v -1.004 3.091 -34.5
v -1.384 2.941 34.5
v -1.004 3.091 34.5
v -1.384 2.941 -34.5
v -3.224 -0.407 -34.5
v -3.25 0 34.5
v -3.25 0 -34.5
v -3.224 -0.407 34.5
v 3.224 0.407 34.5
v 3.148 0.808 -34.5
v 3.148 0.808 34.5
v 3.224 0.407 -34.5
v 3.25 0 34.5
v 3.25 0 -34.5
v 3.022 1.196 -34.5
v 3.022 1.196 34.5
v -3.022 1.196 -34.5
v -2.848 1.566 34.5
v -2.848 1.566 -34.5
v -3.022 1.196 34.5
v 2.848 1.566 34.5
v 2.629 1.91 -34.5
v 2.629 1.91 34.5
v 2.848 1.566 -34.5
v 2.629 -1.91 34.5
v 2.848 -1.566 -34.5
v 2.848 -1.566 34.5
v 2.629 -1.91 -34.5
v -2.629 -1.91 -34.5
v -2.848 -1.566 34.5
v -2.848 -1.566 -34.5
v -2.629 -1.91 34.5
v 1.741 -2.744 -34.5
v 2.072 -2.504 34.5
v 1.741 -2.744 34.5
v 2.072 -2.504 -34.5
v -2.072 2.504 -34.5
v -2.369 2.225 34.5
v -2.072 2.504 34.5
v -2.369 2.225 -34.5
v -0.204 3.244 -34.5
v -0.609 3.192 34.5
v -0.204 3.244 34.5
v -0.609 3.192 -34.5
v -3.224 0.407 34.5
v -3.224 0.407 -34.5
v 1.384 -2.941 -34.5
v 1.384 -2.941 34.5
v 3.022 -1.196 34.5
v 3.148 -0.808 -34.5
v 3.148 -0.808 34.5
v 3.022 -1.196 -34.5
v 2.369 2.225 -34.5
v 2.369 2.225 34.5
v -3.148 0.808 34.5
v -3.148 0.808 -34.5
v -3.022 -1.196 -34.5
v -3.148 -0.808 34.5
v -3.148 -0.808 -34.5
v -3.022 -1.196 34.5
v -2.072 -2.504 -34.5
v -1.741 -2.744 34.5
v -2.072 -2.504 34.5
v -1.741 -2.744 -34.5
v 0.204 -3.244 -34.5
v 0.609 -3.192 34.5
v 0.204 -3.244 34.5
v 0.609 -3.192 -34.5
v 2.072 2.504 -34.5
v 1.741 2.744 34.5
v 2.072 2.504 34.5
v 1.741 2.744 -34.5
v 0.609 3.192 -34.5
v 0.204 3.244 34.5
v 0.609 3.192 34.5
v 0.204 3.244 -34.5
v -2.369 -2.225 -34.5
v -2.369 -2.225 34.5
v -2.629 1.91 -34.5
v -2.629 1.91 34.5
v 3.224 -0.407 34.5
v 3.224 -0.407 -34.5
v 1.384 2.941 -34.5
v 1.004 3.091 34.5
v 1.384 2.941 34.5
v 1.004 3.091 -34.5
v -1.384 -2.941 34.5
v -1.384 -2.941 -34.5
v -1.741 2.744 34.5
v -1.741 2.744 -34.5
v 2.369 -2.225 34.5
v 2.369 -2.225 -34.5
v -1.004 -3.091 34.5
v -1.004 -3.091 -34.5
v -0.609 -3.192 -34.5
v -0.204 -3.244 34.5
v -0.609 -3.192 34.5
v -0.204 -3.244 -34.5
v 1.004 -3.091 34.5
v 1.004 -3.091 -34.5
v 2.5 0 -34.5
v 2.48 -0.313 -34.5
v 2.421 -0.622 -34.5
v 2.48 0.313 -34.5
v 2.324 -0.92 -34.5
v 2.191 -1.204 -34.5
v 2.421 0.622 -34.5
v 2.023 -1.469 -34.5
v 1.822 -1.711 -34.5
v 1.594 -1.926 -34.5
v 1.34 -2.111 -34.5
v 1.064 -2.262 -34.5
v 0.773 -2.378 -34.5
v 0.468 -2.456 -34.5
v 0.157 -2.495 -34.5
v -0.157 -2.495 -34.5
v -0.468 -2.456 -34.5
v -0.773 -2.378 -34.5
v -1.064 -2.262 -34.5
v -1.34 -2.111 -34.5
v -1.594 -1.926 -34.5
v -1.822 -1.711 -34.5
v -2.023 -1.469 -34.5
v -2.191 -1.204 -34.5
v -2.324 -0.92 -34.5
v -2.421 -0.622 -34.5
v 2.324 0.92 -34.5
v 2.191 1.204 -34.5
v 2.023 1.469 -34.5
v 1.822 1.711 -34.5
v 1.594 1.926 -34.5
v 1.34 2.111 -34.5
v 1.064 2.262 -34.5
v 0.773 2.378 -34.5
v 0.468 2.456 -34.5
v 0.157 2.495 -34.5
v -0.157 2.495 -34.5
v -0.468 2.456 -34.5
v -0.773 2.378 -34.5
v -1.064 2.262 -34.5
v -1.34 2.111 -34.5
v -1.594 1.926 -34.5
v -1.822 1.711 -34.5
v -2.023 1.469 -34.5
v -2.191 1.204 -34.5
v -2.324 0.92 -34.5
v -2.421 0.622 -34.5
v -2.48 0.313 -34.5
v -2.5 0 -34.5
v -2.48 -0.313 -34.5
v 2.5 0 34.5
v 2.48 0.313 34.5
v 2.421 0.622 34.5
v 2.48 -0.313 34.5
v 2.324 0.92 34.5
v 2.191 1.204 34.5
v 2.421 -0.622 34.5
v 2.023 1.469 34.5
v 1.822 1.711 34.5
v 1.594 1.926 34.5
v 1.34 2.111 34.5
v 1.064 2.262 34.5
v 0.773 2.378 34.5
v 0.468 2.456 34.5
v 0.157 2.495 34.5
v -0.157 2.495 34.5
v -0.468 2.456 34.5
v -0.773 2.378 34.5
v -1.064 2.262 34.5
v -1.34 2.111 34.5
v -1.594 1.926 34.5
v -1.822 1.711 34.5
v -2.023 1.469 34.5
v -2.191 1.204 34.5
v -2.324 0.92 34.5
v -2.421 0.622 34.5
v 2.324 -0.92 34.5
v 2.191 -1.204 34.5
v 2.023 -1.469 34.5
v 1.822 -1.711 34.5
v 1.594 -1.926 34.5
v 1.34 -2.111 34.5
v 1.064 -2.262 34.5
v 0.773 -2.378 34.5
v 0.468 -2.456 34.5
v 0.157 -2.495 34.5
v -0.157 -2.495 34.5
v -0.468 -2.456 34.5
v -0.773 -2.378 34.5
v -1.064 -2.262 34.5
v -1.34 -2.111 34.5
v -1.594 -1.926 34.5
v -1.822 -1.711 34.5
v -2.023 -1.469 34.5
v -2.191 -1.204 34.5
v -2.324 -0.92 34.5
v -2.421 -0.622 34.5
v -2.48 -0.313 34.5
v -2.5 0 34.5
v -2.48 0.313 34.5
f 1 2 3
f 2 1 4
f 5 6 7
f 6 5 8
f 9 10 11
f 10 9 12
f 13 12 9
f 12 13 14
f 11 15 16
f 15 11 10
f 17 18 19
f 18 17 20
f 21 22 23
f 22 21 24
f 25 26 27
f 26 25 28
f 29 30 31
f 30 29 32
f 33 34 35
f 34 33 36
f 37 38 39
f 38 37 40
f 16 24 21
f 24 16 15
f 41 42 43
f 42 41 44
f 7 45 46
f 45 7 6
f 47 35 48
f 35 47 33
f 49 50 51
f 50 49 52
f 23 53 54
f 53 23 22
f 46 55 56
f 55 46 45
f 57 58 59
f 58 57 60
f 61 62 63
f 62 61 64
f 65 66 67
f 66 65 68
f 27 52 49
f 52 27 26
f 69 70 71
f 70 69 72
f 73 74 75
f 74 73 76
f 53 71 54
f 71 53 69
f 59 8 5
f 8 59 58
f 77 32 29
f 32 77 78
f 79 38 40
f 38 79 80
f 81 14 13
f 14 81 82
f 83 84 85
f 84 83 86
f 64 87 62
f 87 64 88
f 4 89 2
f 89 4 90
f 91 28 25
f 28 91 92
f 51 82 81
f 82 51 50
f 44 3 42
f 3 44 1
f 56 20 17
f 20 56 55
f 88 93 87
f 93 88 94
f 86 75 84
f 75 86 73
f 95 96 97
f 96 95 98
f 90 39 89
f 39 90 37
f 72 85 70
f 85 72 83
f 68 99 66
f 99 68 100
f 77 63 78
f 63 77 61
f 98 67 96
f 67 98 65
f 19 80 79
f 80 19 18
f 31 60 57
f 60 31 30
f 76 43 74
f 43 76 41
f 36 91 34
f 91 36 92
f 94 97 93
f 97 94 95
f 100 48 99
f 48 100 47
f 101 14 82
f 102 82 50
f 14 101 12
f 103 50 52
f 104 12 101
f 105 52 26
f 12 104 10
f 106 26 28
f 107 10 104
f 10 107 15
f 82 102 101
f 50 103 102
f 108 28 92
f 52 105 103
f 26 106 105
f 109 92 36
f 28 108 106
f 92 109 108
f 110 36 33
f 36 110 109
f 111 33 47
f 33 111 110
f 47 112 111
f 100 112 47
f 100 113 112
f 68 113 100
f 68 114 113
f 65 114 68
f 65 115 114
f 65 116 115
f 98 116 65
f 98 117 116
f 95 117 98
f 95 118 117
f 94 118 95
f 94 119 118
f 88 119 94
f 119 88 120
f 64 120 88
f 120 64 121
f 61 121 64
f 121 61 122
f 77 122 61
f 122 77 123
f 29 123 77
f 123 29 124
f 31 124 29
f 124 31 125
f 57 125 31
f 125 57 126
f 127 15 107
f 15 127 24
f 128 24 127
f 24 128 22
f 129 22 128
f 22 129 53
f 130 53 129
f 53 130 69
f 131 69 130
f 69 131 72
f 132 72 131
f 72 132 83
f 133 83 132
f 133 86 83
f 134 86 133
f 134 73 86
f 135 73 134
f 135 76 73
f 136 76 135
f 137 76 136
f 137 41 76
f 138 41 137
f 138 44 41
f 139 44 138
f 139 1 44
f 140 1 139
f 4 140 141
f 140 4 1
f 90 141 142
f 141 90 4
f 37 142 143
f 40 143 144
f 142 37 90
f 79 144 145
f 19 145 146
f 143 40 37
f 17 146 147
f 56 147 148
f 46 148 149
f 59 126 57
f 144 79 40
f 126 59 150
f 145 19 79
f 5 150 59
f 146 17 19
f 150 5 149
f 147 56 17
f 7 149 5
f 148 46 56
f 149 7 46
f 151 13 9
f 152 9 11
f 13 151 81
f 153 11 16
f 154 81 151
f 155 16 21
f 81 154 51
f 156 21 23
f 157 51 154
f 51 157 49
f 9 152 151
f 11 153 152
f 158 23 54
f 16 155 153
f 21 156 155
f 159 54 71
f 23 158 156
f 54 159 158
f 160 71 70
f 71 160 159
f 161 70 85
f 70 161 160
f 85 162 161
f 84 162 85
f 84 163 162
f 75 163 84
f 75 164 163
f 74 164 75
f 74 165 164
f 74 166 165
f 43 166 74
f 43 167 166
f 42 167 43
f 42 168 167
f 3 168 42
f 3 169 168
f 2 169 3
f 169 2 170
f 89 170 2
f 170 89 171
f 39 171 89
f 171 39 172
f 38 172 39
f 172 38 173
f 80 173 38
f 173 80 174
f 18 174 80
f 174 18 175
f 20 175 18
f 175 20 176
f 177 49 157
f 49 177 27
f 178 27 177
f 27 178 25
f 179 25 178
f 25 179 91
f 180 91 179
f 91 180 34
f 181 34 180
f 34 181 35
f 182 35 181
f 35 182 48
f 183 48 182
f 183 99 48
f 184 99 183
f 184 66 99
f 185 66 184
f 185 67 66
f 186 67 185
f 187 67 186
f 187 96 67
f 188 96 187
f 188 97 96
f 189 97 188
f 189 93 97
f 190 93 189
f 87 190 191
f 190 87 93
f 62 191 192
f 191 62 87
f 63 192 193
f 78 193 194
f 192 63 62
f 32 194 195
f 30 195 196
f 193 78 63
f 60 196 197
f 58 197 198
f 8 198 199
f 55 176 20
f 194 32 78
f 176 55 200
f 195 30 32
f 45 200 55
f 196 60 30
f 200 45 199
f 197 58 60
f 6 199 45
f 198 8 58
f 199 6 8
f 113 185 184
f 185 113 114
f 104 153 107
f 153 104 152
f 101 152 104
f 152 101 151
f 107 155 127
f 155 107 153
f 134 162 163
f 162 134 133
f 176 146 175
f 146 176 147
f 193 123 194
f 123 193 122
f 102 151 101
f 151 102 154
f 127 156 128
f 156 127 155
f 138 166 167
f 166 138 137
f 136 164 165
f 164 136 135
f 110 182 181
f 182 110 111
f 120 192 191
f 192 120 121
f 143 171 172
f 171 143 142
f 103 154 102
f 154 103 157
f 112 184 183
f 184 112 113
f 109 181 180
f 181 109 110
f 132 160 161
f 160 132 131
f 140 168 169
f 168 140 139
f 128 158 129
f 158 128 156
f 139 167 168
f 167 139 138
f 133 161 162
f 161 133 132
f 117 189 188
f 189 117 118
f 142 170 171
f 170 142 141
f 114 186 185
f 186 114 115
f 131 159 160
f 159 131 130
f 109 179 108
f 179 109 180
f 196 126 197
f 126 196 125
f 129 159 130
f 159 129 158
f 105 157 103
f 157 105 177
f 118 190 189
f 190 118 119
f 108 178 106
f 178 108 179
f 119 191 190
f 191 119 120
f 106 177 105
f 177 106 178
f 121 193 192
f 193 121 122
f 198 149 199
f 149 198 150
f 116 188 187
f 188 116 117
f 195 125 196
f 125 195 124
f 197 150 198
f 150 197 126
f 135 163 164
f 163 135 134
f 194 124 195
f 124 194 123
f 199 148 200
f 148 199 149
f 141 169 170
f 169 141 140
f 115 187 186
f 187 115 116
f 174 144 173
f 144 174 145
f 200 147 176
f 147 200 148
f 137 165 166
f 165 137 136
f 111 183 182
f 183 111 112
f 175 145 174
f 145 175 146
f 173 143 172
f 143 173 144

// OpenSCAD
$fn = 50;


difference() {
	union() {
		translate(v = [0, 0, -34.5000000000]) {
			cylinder(h = 69, r = 3.2500000000);
		}
	}
	union() {
		translate(v = [0, 0, -100.0000000000]) {
			cylinder(h = 200, r = 2.5000000000);
		}
	}
}
